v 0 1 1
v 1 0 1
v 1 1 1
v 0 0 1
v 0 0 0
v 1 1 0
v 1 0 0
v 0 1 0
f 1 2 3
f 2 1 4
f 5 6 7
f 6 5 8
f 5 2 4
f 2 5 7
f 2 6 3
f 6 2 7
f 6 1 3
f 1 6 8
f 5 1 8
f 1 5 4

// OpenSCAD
// file: web-colours.scad
//
// Based on extended web colours listed on https://en.wikipedia.org/wiki/Web_colors#Extended_colors
//

WEB_COLOURS_PINK = [
    "MediumVioletRed",
    "DeepPink",
    "PaleVioletRed",
    "HotPink",
    "LightPink",
    "Pink",
];

WEB_COLOURS_RED = [
    "DarkRed",
    "Red",
    "Firebrick",
    "Crimson",
    "IndianRed",
    "LightCoral",
    "Salmon",
    "DarkSalmon",
    "LightSalmon",
];

WEB_COLOURS_PURPLE_VIOLET_MAGENTA = [
    "Indigo",
    "Purple",
    "DarkMagenta",
    "DarkViolet",
    "DarkSlateBlue",
    "BlueViolet",
    "DarkOrchid",
    "Fuchsia",
    "Magenta",
    "SlateBlue",
    "MediumSlateBlue",
    "MediumOrchid",
    "MediumPurple",
    "Orchid",
    "Violet",
    "Plum",
    "Thistle",
    "Lavender",
];

WEB_COLOURS_ORANGE = [
    "OrangeRed",
    "Tomato",
    "DarkOrange",
    "Coral",
    "Orange",
];

WEB_COLOURS_YELLOW = [
    "DarkKhaki",
    "Gold",
    "Khaki",
    "PeachPuff",
    "Yellow",
    "PaleGoldenrod",
    "Moccasin",
    "PapayaWhip",
    "LightGoldenrodYellow",
    "LemonChiffon",
    "LightYellow",
];

WEB_COLOURS_BLUE = [
    "MidnightBlue",
    "Navy",
    "DarkBlue",
    "MediumBlue",
    "Blue",
    "RoyalBlue",
    "SteelBlue",
    "DodgerBlue",
    "DeepSkyBlue",
    "CornflowerBlue",
    "SkyBlue",
    "LightSkyBlue",
    "LightSteelBlue",
    "LightBlue",
    "PowderBlue",
];

WEB_COLOURS_CYAN = [
    "Teal",
    "DarkCyan",
    "LightSeaGreen",
    "CadetBlue",
    "DarkTurquoise",
    "MediumTurquoise",
    "Turquoise",
    "Aqua",
    "Cyan",
    "Aquamarine",
    "PaleTurquoise",
    "LightCyan",
];

WEB_COLOURS_BROWN = [
    "Maroon",
    "Brown",
    "SaddleBrown",
    "Sienna",
    "Chocolate",
    "DarkGoldenrod",
    "Peru",
    "RosyBrown",
    "Goldenrod",
    "SandyBrown",
    "Tan",
    "Burlywood",
    "Wheat",
    "NavajoWhite",
    "Bisque",
    "BlanchedAlmond",
    "Cornsilk",
];

WEB_COLOURS_GREEN = [
    "DarkGreen",
    "Green",
    "DarkOliveGreen",
    "ForestGreen",
    "SeaGreen",
    "Olive",
    "OliveDrab",
    "MediumSeaGreen",
    "LimeGreen",
    "Lime",
    "SpringGreen",
    "MediumSpringGreen",
    "DarkSeaGreen",
    "MediumAquamarine",
    "YellowGreen",
    "LawnGreen",
    "Chartreuse",
    "LightGreen",
    "GreenYellow",
    "PaleGreen",
];

WEB_COLOURS_WHITE = [
    "MistyRose",
    "AntiqueWhite",
    "Linen",
    "Beige",
    "WhiteSmoke",
    "LavenderBlush",
    "OldLace",
    "AliceBlue",
    "Seashell",
    "GhostWhite",
    "Honeydew",
    "FloralWhite",
    "Azure",
    "MintCream",
    "Snow",
    "Ivory",
    "White",
];

WEB_COLOURS_GRAY_BLACK = [
    "Black",
    "DarkSlateGray",
    "DimGray",
    "SlateGray",
    "Gray",
    "LightSlateGray",
    "DarkGray",
    "Silver",
    "LightGray",
    "Gainsboro",
];

// https://en.wikibooks.org/wiki/OpenSCAD_User_Manual/List_Comprehensions#Flattening_a_nested_vector
function flatten(l) = [ for (a = l) for (b = a) b ];

WEB_COLOURS_ALL = flatten([
    WEB_COLOURS_PINK,
    WEB_COLOURS_RED,
    WEB_COLOURS_PURPLE_VIOLET_MAGENTA,
    WEB_COLOURS_ORANGE,
    WEB_COLOURS_YELLOW,
    WEB_COLOURS_BLUE,
    WEB_COLOURS_CYAN,
    WEB_COLOURS_BROWN,
    WEB_COLOURS_GREEN,
    WEB_COLOURS_WHITE,
    WEB_COLOURS_GRAY_BLACK,
]);

function randElementFromArray(list) = list[rands(0, len(list), 1)[0]];
// main file
include <web-colours.scad>

colour = randElementFromArray(WEB_COLOURS_ALL); // Random selection from all colours
//colour = randElementFromArray(WEB_COLOURS_BLUE); // Just from the blue range

color(colour)
cube([1, 1, 1]);
